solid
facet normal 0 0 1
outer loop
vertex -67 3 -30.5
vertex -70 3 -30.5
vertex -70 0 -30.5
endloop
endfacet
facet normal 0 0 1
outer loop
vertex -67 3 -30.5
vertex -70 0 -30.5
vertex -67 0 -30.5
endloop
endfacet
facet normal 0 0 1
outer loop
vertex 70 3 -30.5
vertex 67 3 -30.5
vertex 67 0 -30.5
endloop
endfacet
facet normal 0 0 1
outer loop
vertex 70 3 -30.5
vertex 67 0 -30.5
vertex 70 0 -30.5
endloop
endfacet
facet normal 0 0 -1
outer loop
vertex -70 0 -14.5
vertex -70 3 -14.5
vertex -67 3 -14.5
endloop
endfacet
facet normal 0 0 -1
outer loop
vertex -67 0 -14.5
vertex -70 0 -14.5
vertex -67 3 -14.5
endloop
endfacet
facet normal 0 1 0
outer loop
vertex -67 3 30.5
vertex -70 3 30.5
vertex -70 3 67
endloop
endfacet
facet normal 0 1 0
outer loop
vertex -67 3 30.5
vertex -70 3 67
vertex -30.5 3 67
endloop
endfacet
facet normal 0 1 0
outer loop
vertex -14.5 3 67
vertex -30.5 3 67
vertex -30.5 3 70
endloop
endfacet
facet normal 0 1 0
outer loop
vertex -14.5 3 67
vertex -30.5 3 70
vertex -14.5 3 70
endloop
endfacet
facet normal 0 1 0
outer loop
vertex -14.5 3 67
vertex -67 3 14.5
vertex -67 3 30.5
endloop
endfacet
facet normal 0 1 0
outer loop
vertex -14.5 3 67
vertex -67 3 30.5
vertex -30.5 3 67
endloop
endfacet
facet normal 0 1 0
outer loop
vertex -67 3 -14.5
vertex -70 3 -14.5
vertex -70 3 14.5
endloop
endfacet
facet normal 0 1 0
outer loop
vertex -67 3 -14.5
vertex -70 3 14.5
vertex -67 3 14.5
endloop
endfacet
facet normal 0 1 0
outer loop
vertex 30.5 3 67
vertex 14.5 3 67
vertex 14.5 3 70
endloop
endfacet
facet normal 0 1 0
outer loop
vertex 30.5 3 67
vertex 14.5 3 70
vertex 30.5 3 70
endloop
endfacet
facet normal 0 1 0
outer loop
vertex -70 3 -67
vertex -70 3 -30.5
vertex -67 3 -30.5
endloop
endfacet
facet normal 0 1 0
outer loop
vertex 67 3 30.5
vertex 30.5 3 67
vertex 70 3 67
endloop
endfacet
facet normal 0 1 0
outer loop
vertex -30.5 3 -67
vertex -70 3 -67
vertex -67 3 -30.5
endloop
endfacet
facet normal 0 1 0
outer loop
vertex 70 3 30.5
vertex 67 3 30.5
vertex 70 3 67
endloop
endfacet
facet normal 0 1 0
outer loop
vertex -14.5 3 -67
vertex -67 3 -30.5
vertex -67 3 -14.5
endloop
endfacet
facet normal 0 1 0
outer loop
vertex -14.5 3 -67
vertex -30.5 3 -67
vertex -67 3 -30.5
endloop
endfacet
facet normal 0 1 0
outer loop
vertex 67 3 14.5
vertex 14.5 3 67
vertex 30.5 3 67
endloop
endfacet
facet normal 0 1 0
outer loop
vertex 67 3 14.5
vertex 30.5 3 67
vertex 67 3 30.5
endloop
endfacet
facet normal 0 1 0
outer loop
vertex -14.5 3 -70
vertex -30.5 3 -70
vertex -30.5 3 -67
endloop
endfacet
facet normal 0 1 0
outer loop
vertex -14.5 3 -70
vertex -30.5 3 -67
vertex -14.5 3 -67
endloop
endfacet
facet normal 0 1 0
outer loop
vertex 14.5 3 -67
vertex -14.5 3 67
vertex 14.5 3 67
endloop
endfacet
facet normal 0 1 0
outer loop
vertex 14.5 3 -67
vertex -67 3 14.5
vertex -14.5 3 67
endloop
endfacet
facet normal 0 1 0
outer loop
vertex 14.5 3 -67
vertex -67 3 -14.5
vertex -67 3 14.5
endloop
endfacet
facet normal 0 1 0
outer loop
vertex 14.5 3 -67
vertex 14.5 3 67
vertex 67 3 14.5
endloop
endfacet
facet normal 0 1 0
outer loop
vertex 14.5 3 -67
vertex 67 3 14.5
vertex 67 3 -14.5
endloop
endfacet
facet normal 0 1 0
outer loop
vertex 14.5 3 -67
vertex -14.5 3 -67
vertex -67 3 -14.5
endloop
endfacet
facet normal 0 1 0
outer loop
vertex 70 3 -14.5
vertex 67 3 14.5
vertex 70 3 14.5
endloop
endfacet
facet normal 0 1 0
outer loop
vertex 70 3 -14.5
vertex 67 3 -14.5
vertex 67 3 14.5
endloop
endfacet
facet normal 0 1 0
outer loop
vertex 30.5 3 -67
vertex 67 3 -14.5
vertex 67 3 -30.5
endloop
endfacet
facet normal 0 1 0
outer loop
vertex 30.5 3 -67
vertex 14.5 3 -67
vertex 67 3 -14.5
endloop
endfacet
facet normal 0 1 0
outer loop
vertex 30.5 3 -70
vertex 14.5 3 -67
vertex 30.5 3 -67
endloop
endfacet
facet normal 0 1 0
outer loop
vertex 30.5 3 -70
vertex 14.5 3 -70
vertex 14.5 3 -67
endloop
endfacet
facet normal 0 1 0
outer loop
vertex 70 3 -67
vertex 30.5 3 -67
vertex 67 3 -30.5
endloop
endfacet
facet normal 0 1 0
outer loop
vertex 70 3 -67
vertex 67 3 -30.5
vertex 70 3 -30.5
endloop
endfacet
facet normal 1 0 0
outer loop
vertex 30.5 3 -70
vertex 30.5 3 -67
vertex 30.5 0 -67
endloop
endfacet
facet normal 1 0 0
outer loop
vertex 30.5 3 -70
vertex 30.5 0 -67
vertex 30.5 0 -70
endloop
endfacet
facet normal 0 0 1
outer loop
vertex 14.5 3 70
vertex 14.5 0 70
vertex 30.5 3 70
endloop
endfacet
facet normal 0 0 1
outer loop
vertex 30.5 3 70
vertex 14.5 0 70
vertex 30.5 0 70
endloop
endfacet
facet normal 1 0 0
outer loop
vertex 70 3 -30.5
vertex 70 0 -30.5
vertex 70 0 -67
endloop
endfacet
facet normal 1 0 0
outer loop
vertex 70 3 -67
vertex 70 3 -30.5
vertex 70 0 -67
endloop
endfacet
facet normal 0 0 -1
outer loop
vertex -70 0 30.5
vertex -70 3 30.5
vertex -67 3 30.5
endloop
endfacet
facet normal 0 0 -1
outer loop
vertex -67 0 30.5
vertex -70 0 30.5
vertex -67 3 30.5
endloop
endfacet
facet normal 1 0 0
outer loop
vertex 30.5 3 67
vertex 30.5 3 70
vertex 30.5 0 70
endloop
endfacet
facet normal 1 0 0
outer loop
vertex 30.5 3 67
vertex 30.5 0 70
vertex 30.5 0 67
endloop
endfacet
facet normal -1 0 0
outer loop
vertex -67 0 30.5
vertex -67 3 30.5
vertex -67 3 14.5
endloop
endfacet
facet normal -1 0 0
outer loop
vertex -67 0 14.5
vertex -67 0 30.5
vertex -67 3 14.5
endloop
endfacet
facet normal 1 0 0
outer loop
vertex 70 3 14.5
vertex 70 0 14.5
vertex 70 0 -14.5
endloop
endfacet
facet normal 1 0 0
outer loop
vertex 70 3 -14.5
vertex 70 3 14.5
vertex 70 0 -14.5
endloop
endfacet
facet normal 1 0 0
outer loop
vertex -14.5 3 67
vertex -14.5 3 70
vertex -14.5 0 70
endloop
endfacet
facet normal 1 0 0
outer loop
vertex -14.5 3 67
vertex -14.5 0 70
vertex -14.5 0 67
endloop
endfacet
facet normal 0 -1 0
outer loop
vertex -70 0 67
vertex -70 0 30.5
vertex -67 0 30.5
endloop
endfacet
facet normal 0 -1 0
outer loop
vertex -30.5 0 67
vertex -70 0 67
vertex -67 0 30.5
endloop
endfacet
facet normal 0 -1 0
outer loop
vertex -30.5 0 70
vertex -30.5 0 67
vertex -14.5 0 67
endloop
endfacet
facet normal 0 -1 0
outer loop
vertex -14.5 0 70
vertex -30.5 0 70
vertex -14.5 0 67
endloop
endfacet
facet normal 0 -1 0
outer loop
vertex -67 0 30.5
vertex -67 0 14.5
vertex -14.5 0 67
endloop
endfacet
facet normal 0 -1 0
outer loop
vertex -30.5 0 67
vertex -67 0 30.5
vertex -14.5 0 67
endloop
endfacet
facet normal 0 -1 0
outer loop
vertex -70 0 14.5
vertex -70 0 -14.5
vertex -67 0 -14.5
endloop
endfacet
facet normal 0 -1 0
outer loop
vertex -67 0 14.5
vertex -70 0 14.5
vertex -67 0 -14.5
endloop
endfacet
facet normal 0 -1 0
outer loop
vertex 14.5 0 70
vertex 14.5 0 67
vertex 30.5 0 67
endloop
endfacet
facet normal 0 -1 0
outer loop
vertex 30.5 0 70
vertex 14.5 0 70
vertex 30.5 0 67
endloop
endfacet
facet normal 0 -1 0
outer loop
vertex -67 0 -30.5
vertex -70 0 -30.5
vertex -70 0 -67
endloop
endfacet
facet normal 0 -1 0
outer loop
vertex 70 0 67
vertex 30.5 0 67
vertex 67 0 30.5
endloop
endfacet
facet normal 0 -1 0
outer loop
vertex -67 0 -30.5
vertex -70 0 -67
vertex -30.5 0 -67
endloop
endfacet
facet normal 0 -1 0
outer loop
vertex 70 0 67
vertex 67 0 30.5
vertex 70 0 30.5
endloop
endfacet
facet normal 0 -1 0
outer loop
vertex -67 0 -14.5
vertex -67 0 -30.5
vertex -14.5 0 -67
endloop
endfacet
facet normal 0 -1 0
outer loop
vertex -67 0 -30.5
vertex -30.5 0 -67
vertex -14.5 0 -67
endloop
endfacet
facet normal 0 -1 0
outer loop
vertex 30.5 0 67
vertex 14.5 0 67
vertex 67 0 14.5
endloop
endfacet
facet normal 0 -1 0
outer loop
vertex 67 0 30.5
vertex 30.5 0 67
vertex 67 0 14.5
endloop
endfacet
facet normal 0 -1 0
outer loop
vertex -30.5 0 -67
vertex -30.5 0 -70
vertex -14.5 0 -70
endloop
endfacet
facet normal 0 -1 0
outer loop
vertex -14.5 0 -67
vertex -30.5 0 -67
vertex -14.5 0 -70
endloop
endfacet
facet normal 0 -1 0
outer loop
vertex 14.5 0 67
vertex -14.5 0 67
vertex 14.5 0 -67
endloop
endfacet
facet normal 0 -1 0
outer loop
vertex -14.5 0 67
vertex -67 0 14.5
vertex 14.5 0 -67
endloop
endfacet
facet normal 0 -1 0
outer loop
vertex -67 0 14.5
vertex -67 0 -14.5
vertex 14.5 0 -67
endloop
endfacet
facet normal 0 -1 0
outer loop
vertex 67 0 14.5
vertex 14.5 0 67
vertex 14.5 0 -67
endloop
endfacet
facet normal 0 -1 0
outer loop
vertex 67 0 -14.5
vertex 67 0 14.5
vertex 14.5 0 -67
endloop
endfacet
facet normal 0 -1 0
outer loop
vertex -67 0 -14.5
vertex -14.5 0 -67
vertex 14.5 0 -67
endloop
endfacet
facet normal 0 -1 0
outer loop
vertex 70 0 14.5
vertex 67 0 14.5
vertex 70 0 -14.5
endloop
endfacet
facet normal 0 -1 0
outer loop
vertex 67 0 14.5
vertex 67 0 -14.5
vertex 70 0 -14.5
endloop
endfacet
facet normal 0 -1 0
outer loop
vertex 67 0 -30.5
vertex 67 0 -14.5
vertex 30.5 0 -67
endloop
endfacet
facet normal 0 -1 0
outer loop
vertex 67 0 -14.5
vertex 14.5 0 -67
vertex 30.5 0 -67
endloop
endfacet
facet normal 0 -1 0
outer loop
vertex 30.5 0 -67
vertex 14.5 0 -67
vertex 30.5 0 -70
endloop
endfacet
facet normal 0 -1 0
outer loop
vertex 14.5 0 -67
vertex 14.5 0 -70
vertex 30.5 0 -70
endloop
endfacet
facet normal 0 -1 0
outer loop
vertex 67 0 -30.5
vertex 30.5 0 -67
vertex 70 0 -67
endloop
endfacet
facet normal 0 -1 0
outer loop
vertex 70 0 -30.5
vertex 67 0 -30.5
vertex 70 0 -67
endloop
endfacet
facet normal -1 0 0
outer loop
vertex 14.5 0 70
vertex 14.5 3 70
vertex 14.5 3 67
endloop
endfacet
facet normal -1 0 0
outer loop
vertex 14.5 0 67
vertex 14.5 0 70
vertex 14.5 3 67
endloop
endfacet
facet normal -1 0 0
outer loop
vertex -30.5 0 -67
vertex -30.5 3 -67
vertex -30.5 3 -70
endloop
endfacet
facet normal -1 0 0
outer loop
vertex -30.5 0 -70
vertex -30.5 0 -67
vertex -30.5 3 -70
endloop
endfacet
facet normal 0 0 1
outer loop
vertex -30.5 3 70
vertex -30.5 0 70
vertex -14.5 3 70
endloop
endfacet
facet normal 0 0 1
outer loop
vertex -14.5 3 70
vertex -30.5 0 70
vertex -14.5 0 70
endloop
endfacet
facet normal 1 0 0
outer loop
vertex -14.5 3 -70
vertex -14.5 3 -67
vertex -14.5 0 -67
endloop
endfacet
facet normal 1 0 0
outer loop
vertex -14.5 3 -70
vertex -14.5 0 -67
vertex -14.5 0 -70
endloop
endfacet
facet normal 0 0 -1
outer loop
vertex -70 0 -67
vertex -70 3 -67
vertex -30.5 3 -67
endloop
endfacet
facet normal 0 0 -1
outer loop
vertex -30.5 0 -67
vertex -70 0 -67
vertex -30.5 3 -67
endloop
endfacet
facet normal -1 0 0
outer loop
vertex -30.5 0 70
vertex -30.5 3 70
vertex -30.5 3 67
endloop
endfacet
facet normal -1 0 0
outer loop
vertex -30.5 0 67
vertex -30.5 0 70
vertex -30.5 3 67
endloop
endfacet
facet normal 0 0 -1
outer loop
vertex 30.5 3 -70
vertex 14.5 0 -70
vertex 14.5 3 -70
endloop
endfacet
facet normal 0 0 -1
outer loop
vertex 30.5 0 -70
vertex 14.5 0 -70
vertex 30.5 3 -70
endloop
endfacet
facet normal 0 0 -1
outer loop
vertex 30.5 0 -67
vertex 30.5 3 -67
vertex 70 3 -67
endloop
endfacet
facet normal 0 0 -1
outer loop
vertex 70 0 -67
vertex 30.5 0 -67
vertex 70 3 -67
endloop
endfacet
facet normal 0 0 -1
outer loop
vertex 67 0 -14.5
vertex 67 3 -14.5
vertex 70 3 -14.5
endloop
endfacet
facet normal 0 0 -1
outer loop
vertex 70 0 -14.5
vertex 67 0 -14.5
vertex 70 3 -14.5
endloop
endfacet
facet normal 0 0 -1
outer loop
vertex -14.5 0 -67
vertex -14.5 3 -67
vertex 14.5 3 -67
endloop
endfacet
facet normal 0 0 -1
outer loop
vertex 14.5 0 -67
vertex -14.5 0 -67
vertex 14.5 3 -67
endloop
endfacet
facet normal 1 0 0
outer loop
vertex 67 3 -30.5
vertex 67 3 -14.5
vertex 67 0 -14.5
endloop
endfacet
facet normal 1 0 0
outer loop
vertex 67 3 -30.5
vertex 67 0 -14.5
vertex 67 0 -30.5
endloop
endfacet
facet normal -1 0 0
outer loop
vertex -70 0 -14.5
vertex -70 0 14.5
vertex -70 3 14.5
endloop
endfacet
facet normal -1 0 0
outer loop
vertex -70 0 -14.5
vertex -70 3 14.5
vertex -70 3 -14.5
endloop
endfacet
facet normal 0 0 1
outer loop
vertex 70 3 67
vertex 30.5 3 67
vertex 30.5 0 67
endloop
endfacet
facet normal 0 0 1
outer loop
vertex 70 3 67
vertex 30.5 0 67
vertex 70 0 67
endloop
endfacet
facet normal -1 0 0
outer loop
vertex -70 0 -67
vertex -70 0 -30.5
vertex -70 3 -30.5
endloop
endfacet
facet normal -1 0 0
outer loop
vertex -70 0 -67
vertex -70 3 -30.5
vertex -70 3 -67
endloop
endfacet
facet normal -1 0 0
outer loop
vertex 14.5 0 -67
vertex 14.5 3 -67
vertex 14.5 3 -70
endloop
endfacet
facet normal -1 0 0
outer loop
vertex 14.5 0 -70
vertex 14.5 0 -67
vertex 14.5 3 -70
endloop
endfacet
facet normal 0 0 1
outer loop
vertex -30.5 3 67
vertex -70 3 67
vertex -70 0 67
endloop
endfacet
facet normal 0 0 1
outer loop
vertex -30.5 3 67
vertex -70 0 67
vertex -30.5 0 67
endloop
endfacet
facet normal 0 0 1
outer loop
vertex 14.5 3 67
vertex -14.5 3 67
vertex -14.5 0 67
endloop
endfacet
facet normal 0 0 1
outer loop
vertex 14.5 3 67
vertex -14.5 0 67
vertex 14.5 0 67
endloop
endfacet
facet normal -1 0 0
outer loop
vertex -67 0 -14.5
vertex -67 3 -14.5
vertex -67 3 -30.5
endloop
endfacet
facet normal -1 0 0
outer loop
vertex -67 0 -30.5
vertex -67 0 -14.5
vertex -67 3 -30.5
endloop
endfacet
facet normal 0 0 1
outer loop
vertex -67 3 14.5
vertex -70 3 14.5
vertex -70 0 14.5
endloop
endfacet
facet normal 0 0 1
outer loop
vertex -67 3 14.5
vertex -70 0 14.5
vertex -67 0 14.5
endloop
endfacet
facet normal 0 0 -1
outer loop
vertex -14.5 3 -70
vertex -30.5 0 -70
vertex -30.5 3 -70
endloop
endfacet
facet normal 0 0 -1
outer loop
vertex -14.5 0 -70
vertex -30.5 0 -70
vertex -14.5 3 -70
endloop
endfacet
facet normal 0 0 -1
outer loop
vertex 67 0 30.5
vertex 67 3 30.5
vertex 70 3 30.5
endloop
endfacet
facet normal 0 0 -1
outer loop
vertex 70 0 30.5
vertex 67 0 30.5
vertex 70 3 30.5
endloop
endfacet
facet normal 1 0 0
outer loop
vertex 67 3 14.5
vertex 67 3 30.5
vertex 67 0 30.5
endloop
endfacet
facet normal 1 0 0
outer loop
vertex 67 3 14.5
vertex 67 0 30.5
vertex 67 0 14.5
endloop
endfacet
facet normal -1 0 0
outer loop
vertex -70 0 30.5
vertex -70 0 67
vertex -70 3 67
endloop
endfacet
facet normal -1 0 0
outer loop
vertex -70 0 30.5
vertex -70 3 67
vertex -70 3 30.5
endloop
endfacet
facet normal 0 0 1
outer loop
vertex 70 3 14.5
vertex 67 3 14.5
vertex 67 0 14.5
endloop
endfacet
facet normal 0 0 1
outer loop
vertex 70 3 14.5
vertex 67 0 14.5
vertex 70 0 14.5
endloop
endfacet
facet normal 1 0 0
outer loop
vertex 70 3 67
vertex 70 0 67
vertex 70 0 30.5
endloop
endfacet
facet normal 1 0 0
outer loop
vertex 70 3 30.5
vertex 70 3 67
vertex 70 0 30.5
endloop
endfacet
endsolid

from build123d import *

# Parameters (mm, degrees)
SKETCH1_W           = 140
SKETCH1_H           = 140
BOSS_EXTRUDE1_DEPTH = 3
SKETCH2_W           = 39.5
SKETCH2_H           = 3
SKETCH2_W_2         = 29
CUT_EXTRUDE2_DEPTH  = 3
SKETCH4_W           = 3
SKETCH4_H           = 16
CUT_EXTRUDE3_DEPTH  = 3


with BuildPart() as part:
    # Sketch1 → Boss-Extrude1 (new body)
    with BuildSketch(Plane(origin=(0, 0, 0), x_dir=(1, 0, 0), z_dir=(0, 1, 0))):
        Rectangle(SKETCH1_W, SKETCH1_H)
    extrude(amount=BOSS_EXTRUDE1_DEPTH)

    # Sketch2 → Cut-Extrude2 (cut)
    with BuildSketch(Plane(origin=(0, 3, 0), x_dir=(1, 0, 0), z_dir=(0, 1, 0))):
        with Locations((-50.25, 68.5)):
            Rectangle(SKETCH2_W, SKETCH2_H)
        with Locations((-50.25, -68.5)):
            Rectangle(SKETCH2_W, SKETCH2_H)
        with Locations((50.25, -68.5)):
            Rectangle(SKETCH2_W, SKETCH2_H)
        with Locations((50.25, 68.5)):
            Rectangle(SKETCH2_W, SKETCH2_H)
        with Locations((0, 68.5)):
            Rectangle(SKETCH2_W_2, SKETCH2_H)
        with Locations((0, -68.5)):
            Rectangle(SKETCH2_W_2, SKETCH2_H)
    extrude(amount=-CUT_EXTRUDE2_DEPTH, mode=Mode.SUBTRACT)

    # Sketch4 → Cut-Extrude3 (cut)
    with BuildSketch(Plane(origin=(0, 3, 0), x_dir=(1, 0, 0), z_dir=(0, 1, 0))):
        with Locations((-68.5, 22.5)):
            Rectangle(SKETCH4_W, SKETCH4_H)
        with Locations((-68.5, -22.5)):
            Rectangle(SKETCH4_W, SKETCH4_H)
        with Locations((68.5, 22.5)):
            Rectangle(SKETCH4_W, SKETCH4_H)
        with Locations((68.5, -22.5)):
            Rectangle(SKETCH4_W, SKETCH4_H)
    extrude(amount=-CUT_EXTRUDE3_DEPTH, mode=Mode.SUBTRACT)


solid = part.part
